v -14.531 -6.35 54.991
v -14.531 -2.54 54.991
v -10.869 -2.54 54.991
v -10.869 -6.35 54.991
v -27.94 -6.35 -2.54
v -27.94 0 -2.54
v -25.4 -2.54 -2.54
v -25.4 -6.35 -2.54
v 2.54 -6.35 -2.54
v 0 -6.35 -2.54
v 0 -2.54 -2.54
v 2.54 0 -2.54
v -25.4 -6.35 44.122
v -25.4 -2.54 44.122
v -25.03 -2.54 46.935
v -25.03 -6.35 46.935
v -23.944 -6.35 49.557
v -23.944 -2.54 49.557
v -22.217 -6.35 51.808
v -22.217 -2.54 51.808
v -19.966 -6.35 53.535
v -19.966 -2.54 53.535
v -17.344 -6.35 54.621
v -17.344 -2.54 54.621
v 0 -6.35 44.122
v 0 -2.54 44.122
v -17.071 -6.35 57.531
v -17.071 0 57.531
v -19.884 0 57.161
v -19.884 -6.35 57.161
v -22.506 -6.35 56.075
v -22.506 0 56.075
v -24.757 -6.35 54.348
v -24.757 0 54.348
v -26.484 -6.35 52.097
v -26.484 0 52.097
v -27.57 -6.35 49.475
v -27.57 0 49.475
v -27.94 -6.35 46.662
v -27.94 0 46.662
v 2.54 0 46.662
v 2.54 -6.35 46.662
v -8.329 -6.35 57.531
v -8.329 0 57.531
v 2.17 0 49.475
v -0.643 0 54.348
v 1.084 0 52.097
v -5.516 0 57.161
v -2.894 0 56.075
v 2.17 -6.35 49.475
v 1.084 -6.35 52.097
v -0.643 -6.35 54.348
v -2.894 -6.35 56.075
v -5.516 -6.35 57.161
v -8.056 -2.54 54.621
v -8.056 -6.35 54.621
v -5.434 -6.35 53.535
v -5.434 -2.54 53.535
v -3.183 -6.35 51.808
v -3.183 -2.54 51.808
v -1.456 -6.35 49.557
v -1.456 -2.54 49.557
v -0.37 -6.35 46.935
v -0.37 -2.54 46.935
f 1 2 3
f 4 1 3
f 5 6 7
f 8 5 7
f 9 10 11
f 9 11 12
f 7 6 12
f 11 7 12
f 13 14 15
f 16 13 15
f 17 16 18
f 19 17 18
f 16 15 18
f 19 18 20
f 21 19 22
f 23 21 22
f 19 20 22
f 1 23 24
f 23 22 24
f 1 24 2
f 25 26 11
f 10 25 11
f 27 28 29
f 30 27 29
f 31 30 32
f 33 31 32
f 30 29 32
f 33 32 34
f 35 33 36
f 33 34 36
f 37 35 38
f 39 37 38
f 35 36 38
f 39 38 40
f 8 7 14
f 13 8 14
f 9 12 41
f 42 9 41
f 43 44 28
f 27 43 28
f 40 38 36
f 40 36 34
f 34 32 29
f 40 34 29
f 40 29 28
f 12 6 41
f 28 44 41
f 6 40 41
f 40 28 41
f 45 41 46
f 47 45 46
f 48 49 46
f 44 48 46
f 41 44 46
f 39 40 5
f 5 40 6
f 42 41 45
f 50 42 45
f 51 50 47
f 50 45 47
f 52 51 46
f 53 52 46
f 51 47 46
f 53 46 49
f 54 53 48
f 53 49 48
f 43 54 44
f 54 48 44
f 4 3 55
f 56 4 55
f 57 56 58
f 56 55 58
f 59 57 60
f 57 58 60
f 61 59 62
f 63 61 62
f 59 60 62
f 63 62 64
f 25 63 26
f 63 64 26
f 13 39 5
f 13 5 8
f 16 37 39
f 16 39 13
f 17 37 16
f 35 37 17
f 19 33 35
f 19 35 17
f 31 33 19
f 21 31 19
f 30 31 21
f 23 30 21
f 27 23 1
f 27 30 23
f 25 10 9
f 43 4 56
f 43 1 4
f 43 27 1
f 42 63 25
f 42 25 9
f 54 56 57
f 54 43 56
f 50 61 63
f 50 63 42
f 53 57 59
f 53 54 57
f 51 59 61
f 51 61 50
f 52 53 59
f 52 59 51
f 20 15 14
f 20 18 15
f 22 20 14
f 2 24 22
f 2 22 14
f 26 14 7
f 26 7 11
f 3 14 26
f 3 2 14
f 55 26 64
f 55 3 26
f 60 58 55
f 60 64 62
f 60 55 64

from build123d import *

# Parameters (mm, degrees)
F0_W     = 2.54
F0_H     = 2.54
F1_DEPTH = 6.35
F3_DEPTH = 2.54


# Not quite as in the source:
# - a feature names something its author has since deleted; it is built from what else it names


with BuildPart() as f1:
    # F0 (on Front) → F1 (new body)
    with BuildSketch(Plane.XZ):
        with BuildLine():
            Line((-10.8688886, 57.531), (-10.8688886, 54.991))
            ThreePointArc((-10.8688886, 54.991), (-3.183423767, 51.807576233), (0, 44.1221114))
            Line((0, 44.1221114), (0, 0))
            Line((0, 0), (2.54, 0))
            Line((2.54, 0), (2.54, 46.6621114))
            ThreePointArc((2.54, 46.6621114), (-0.643423767, 54.347576233), (-8.3288886, 57.531))
            Line((-8.3288886, 57.531), (-10.8688886, 57.531))
        make_face()
        with BuildLine():
            Line((-14.5311114, 54.991), (-10.8688886, 54.991))
            Line((-10.8688886, 54.991), (-10.8688886, 57.531))
            Line((-10.8688886, 57.531), (-17.0711114, 57.531))
            ThreePointArc((-17.0711114, 57.531), (-24.756576233, 54.347576233), (-27.94, 46.6621114))
            Line((-27.94, 46.6621114), (-27.94, 0))
            Line((-27.94, 0), (-25.4, 0))
            Line((-25.4, 0), (-25.4, 44.1221114))
            ThreePointArc((-25.4, 44.1221114), (-22.216576233, 51.807576233), (-14.5311114, 54.991))
        make_face()
        with Locations((1.27, -1.27)):
            Rectangle(F0_W, F0_H)
        with Locations((-26.67, -1.27)):
            Rectangle(F0_W, F0_H)
    extrude(amount=F1_DEPTH)

    # F2 (on Front) → F3 (join)
    with BuildSketch(Plane.XZ):
        with BuildLine():
            Line((-27.94, -2.54), (0, -2.54))
            Line((0, -2.54), (2.54, -2.54))
            Line((2.54, -2.54), (2.54, 46.6621114))
            ThreePointArc((2.54, 46.6621114), (-0.643423767, 54.347576233), (-8.3288886, 57.531))
            Line((-8.3288886, 57.531), (-17.0711114, 57.531))
            ThreePointArc((-17.0711114, 57.531), (-24.756576233, 54.347576233), (-27.94, 46.6621114))
            Line((-27.94, 46.6621114), (-27.94, -2.54))
        make_face()
    extrude(amount=F3_DEPTH)


solid = f1.part
